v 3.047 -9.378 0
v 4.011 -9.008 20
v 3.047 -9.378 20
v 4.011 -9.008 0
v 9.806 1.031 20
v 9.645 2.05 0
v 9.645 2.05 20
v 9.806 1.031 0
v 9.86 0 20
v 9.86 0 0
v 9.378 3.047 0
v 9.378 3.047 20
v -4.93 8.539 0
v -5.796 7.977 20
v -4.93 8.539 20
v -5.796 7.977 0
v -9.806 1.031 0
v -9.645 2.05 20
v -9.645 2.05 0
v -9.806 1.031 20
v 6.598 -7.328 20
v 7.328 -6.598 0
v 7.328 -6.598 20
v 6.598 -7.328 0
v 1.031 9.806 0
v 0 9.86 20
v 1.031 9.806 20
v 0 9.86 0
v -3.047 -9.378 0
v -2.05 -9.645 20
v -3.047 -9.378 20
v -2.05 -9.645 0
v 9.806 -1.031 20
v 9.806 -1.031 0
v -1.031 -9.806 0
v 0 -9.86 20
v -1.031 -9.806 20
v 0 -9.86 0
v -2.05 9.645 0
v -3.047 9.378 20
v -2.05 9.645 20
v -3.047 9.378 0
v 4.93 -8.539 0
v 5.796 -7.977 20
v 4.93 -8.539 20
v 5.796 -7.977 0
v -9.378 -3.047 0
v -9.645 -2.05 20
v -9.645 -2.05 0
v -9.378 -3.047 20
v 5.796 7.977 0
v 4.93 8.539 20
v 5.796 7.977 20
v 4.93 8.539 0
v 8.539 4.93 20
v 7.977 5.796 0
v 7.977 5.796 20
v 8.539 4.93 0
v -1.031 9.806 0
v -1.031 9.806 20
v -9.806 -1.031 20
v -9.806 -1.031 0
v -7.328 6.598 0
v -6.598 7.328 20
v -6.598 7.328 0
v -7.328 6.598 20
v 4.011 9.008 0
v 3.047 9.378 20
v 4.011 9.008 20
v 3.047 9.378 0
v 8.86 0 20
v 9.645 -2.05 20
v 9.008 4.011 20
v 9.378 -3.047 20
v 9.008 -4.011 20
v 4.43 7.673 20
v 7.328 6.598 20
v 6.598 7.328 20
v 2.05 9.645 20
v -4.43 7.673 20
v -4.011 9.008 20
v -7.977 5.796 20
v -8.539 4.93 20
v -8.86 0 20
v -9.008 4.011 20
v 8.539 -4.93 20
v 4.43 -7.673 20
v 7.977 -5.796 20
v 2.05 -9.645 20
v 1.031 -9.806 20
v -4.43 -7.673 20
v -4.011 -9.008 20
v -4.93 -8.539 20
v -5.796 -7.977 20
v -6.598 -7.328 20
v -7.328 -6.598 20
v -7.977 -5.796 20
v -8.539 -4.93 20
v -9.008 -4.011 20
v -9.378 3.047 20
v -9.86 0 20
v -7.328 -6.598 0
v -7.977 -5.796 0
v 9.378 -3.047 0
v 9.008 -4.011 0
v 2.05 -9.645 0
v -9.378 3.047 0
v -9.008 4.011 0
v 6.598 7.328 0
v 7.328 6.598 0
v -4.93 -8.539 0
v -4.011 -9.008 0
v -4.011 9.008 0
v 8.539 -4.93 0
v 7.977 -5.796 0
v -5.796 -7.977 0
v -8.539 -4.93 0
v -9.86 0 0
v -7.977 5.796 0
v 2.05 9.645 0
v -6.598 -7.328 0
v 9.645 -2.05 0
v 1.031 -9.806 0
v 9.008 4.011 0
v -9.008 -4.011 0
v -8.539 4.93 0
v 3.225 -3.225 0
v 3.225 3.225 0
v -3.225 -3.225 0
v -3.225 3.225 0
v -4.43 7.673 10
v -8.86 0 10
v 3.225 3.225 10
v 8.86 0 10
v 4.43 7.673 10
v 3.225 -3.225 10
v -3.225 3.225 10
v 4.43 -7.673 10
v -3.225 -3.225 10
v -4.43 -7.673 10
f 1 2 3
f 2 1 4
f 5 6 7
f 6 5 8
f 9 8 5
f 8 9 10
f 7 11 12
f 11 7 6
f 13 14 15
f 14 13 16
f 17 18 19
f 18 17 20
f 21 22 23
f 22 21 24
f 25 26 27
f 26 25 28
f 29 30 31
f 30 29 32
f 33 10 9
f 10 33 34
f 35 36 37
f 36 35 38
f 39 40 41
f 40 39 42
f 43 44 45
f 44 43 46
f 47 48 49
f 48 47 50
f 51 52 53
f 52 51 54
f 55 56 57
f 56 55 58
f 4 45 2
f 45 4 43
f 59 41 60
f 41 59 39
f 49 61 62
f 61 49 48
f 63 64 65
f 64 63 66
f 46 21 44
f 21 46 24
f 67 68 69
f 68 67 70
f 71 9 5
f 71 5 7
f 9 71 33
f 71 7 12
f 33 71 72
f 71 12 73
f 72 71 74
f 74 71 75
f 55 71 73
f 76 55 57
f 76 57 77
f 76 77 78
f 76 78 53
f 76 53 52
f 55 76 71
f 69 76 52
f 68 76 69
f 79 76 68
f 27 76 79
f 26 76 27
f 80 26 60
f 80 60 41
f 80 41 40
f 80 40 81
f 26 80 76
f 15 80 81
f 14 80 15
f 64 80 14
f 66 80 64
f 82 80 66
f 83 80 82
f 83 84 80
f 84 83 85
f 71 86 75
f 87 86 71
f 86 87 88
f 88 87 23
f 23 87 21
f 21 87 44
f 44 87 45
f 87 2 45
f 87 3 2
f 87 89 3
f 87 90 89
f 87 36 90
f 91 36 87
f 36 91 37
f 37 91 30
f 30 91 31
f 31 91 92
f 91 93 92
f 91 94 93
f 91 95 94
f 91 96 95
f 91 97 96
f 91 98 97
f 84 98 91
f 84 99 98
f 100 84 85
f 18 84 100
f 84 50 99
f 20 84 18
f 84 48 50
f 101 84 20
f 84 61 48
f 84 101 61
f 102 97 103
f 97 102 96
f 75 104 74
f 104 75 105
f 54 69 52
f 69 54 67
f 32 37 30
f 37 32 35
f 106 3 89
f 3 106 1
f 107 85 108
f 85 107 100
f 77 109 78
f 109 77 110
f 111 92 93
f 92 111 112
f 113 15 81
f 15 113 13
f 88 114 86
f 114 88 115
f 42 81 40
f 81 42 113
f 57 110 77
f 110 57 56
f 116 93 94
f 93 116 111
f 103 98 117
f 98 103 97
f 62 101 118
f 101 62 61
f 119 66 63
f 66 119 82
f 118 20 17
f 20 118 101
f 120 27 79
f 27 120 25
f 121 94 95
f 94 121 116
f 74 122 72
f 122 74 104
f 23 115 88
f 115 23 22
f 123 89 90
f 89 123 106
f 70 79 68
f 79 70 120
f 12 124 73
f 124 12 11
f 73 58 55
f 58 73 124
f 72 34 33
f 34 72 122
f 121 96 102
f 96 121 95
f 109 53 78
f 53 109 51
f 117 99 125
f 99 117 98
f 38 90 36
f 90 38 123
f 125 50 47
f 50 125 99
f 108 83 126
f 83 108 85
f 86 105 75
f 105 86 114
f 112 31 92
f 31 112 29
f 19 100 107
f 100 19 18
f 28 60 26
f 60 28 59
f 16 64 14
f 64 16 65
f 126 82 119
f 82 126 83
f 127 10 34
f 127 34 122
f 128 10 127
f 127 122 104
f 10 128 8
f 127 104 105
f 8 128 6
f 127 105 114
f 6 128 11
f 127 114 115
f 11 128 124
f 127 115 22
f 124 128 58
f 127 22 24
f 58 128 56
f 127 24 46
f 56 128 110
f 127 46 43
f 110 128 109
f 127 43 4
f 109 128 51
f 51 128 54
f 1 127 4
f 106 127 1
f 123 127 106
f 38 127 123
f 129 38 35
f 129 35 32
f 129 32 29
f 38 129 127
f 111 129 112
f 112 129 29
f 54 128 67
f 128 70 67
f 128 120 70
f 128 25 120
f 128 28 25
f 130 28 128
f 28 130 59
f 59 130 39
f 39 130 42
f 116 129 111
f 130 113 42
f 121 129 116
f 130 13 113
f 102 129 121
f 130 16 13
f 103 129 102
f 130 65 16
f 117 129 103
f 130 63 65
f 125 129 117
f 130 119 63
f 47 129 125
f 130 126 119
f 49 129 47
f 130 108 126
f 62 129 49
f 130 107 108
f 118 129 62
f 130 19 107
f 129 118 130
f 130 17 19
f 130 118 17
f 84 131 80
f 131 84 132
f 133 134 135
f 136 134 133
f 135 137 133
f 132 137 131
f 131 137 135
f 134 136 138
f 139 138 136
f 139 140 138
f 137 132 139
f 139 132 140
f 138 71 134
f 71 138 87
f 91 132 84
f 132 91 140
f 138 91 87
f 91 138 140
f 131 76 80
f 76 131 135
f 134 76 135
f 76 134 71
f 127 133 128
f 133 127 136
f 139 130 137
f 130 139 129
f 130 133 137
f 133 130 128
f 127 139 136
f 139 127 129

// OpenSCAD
// file: ../lib/mylib.scad
module rotz(deg=90) {
    children();
    
    rotate([0, 0, deg])
    children();
}

module mirror_x() {
    children();
    
    mirror([1, 0, 0])
    children();
}

module mirror_y() {
    children();
    
    mirror([0, 1, 0])
    children();
}

module mirror_z() {
    children();
    
    mirror([0, 0, 1])
    children();
}

module z_rot_copy(r=0, deg=90, offset_deg=0) {
    arr = [0:deg:360];
    for(rot=arr) {
        rotate([0, 0, rot+offset_deg])
        translate([r, 0, 0])
        children();
    }
}

module cut_x() {
    intersection() {
        children();
        
        translate([-500, 0, -500])
        cube(1000);
    }
}
module cut_z() {
    intersection() {
        children();
        
        translate([-500, -500, 0])
        cube(1000);
    }
}

module hexagon(r, h) {
    linear_extrude(h)
    scale([r, r, 1])
    regular_polygon(6);
}

 module regular_polygon(order, r=1){
    angles=[ for (i = [0:order-1]) i*(360/order) ];
    coords=[ for (th=angles) [r*cos(th), r*sin(th)] ];
    polygon(coords);
 }
// main file
use <../lib/mylib.scad>;

$fn=60;

x=15;

d=x/cos(30);
slack=0.2;
wall=2;

//rotate([180, 0, 0])
difference() {
    cylinder(h=20, d=d+2*slack+wall);

    translate([0, 0, 20-10])
    hexagon(
        d/2+slack,
        100
    );

    // TODO: Gub-Haindrich method of co-axial hexes
    cube([6.45, 6.45, 100], center=true);
}

module hexagon(r, h) {
    linear_extrude(h)
    scale([r, r, 1])
    regular_polygon(6);
}

 module regular_polygon(order, r=1){
    angles=[ for (i = [0:order-1]) i*(360/order) ];
    coords=[ for (th=angles) [r*cos(th), r*sin(th)] ];
    polygon(coords);
 }
